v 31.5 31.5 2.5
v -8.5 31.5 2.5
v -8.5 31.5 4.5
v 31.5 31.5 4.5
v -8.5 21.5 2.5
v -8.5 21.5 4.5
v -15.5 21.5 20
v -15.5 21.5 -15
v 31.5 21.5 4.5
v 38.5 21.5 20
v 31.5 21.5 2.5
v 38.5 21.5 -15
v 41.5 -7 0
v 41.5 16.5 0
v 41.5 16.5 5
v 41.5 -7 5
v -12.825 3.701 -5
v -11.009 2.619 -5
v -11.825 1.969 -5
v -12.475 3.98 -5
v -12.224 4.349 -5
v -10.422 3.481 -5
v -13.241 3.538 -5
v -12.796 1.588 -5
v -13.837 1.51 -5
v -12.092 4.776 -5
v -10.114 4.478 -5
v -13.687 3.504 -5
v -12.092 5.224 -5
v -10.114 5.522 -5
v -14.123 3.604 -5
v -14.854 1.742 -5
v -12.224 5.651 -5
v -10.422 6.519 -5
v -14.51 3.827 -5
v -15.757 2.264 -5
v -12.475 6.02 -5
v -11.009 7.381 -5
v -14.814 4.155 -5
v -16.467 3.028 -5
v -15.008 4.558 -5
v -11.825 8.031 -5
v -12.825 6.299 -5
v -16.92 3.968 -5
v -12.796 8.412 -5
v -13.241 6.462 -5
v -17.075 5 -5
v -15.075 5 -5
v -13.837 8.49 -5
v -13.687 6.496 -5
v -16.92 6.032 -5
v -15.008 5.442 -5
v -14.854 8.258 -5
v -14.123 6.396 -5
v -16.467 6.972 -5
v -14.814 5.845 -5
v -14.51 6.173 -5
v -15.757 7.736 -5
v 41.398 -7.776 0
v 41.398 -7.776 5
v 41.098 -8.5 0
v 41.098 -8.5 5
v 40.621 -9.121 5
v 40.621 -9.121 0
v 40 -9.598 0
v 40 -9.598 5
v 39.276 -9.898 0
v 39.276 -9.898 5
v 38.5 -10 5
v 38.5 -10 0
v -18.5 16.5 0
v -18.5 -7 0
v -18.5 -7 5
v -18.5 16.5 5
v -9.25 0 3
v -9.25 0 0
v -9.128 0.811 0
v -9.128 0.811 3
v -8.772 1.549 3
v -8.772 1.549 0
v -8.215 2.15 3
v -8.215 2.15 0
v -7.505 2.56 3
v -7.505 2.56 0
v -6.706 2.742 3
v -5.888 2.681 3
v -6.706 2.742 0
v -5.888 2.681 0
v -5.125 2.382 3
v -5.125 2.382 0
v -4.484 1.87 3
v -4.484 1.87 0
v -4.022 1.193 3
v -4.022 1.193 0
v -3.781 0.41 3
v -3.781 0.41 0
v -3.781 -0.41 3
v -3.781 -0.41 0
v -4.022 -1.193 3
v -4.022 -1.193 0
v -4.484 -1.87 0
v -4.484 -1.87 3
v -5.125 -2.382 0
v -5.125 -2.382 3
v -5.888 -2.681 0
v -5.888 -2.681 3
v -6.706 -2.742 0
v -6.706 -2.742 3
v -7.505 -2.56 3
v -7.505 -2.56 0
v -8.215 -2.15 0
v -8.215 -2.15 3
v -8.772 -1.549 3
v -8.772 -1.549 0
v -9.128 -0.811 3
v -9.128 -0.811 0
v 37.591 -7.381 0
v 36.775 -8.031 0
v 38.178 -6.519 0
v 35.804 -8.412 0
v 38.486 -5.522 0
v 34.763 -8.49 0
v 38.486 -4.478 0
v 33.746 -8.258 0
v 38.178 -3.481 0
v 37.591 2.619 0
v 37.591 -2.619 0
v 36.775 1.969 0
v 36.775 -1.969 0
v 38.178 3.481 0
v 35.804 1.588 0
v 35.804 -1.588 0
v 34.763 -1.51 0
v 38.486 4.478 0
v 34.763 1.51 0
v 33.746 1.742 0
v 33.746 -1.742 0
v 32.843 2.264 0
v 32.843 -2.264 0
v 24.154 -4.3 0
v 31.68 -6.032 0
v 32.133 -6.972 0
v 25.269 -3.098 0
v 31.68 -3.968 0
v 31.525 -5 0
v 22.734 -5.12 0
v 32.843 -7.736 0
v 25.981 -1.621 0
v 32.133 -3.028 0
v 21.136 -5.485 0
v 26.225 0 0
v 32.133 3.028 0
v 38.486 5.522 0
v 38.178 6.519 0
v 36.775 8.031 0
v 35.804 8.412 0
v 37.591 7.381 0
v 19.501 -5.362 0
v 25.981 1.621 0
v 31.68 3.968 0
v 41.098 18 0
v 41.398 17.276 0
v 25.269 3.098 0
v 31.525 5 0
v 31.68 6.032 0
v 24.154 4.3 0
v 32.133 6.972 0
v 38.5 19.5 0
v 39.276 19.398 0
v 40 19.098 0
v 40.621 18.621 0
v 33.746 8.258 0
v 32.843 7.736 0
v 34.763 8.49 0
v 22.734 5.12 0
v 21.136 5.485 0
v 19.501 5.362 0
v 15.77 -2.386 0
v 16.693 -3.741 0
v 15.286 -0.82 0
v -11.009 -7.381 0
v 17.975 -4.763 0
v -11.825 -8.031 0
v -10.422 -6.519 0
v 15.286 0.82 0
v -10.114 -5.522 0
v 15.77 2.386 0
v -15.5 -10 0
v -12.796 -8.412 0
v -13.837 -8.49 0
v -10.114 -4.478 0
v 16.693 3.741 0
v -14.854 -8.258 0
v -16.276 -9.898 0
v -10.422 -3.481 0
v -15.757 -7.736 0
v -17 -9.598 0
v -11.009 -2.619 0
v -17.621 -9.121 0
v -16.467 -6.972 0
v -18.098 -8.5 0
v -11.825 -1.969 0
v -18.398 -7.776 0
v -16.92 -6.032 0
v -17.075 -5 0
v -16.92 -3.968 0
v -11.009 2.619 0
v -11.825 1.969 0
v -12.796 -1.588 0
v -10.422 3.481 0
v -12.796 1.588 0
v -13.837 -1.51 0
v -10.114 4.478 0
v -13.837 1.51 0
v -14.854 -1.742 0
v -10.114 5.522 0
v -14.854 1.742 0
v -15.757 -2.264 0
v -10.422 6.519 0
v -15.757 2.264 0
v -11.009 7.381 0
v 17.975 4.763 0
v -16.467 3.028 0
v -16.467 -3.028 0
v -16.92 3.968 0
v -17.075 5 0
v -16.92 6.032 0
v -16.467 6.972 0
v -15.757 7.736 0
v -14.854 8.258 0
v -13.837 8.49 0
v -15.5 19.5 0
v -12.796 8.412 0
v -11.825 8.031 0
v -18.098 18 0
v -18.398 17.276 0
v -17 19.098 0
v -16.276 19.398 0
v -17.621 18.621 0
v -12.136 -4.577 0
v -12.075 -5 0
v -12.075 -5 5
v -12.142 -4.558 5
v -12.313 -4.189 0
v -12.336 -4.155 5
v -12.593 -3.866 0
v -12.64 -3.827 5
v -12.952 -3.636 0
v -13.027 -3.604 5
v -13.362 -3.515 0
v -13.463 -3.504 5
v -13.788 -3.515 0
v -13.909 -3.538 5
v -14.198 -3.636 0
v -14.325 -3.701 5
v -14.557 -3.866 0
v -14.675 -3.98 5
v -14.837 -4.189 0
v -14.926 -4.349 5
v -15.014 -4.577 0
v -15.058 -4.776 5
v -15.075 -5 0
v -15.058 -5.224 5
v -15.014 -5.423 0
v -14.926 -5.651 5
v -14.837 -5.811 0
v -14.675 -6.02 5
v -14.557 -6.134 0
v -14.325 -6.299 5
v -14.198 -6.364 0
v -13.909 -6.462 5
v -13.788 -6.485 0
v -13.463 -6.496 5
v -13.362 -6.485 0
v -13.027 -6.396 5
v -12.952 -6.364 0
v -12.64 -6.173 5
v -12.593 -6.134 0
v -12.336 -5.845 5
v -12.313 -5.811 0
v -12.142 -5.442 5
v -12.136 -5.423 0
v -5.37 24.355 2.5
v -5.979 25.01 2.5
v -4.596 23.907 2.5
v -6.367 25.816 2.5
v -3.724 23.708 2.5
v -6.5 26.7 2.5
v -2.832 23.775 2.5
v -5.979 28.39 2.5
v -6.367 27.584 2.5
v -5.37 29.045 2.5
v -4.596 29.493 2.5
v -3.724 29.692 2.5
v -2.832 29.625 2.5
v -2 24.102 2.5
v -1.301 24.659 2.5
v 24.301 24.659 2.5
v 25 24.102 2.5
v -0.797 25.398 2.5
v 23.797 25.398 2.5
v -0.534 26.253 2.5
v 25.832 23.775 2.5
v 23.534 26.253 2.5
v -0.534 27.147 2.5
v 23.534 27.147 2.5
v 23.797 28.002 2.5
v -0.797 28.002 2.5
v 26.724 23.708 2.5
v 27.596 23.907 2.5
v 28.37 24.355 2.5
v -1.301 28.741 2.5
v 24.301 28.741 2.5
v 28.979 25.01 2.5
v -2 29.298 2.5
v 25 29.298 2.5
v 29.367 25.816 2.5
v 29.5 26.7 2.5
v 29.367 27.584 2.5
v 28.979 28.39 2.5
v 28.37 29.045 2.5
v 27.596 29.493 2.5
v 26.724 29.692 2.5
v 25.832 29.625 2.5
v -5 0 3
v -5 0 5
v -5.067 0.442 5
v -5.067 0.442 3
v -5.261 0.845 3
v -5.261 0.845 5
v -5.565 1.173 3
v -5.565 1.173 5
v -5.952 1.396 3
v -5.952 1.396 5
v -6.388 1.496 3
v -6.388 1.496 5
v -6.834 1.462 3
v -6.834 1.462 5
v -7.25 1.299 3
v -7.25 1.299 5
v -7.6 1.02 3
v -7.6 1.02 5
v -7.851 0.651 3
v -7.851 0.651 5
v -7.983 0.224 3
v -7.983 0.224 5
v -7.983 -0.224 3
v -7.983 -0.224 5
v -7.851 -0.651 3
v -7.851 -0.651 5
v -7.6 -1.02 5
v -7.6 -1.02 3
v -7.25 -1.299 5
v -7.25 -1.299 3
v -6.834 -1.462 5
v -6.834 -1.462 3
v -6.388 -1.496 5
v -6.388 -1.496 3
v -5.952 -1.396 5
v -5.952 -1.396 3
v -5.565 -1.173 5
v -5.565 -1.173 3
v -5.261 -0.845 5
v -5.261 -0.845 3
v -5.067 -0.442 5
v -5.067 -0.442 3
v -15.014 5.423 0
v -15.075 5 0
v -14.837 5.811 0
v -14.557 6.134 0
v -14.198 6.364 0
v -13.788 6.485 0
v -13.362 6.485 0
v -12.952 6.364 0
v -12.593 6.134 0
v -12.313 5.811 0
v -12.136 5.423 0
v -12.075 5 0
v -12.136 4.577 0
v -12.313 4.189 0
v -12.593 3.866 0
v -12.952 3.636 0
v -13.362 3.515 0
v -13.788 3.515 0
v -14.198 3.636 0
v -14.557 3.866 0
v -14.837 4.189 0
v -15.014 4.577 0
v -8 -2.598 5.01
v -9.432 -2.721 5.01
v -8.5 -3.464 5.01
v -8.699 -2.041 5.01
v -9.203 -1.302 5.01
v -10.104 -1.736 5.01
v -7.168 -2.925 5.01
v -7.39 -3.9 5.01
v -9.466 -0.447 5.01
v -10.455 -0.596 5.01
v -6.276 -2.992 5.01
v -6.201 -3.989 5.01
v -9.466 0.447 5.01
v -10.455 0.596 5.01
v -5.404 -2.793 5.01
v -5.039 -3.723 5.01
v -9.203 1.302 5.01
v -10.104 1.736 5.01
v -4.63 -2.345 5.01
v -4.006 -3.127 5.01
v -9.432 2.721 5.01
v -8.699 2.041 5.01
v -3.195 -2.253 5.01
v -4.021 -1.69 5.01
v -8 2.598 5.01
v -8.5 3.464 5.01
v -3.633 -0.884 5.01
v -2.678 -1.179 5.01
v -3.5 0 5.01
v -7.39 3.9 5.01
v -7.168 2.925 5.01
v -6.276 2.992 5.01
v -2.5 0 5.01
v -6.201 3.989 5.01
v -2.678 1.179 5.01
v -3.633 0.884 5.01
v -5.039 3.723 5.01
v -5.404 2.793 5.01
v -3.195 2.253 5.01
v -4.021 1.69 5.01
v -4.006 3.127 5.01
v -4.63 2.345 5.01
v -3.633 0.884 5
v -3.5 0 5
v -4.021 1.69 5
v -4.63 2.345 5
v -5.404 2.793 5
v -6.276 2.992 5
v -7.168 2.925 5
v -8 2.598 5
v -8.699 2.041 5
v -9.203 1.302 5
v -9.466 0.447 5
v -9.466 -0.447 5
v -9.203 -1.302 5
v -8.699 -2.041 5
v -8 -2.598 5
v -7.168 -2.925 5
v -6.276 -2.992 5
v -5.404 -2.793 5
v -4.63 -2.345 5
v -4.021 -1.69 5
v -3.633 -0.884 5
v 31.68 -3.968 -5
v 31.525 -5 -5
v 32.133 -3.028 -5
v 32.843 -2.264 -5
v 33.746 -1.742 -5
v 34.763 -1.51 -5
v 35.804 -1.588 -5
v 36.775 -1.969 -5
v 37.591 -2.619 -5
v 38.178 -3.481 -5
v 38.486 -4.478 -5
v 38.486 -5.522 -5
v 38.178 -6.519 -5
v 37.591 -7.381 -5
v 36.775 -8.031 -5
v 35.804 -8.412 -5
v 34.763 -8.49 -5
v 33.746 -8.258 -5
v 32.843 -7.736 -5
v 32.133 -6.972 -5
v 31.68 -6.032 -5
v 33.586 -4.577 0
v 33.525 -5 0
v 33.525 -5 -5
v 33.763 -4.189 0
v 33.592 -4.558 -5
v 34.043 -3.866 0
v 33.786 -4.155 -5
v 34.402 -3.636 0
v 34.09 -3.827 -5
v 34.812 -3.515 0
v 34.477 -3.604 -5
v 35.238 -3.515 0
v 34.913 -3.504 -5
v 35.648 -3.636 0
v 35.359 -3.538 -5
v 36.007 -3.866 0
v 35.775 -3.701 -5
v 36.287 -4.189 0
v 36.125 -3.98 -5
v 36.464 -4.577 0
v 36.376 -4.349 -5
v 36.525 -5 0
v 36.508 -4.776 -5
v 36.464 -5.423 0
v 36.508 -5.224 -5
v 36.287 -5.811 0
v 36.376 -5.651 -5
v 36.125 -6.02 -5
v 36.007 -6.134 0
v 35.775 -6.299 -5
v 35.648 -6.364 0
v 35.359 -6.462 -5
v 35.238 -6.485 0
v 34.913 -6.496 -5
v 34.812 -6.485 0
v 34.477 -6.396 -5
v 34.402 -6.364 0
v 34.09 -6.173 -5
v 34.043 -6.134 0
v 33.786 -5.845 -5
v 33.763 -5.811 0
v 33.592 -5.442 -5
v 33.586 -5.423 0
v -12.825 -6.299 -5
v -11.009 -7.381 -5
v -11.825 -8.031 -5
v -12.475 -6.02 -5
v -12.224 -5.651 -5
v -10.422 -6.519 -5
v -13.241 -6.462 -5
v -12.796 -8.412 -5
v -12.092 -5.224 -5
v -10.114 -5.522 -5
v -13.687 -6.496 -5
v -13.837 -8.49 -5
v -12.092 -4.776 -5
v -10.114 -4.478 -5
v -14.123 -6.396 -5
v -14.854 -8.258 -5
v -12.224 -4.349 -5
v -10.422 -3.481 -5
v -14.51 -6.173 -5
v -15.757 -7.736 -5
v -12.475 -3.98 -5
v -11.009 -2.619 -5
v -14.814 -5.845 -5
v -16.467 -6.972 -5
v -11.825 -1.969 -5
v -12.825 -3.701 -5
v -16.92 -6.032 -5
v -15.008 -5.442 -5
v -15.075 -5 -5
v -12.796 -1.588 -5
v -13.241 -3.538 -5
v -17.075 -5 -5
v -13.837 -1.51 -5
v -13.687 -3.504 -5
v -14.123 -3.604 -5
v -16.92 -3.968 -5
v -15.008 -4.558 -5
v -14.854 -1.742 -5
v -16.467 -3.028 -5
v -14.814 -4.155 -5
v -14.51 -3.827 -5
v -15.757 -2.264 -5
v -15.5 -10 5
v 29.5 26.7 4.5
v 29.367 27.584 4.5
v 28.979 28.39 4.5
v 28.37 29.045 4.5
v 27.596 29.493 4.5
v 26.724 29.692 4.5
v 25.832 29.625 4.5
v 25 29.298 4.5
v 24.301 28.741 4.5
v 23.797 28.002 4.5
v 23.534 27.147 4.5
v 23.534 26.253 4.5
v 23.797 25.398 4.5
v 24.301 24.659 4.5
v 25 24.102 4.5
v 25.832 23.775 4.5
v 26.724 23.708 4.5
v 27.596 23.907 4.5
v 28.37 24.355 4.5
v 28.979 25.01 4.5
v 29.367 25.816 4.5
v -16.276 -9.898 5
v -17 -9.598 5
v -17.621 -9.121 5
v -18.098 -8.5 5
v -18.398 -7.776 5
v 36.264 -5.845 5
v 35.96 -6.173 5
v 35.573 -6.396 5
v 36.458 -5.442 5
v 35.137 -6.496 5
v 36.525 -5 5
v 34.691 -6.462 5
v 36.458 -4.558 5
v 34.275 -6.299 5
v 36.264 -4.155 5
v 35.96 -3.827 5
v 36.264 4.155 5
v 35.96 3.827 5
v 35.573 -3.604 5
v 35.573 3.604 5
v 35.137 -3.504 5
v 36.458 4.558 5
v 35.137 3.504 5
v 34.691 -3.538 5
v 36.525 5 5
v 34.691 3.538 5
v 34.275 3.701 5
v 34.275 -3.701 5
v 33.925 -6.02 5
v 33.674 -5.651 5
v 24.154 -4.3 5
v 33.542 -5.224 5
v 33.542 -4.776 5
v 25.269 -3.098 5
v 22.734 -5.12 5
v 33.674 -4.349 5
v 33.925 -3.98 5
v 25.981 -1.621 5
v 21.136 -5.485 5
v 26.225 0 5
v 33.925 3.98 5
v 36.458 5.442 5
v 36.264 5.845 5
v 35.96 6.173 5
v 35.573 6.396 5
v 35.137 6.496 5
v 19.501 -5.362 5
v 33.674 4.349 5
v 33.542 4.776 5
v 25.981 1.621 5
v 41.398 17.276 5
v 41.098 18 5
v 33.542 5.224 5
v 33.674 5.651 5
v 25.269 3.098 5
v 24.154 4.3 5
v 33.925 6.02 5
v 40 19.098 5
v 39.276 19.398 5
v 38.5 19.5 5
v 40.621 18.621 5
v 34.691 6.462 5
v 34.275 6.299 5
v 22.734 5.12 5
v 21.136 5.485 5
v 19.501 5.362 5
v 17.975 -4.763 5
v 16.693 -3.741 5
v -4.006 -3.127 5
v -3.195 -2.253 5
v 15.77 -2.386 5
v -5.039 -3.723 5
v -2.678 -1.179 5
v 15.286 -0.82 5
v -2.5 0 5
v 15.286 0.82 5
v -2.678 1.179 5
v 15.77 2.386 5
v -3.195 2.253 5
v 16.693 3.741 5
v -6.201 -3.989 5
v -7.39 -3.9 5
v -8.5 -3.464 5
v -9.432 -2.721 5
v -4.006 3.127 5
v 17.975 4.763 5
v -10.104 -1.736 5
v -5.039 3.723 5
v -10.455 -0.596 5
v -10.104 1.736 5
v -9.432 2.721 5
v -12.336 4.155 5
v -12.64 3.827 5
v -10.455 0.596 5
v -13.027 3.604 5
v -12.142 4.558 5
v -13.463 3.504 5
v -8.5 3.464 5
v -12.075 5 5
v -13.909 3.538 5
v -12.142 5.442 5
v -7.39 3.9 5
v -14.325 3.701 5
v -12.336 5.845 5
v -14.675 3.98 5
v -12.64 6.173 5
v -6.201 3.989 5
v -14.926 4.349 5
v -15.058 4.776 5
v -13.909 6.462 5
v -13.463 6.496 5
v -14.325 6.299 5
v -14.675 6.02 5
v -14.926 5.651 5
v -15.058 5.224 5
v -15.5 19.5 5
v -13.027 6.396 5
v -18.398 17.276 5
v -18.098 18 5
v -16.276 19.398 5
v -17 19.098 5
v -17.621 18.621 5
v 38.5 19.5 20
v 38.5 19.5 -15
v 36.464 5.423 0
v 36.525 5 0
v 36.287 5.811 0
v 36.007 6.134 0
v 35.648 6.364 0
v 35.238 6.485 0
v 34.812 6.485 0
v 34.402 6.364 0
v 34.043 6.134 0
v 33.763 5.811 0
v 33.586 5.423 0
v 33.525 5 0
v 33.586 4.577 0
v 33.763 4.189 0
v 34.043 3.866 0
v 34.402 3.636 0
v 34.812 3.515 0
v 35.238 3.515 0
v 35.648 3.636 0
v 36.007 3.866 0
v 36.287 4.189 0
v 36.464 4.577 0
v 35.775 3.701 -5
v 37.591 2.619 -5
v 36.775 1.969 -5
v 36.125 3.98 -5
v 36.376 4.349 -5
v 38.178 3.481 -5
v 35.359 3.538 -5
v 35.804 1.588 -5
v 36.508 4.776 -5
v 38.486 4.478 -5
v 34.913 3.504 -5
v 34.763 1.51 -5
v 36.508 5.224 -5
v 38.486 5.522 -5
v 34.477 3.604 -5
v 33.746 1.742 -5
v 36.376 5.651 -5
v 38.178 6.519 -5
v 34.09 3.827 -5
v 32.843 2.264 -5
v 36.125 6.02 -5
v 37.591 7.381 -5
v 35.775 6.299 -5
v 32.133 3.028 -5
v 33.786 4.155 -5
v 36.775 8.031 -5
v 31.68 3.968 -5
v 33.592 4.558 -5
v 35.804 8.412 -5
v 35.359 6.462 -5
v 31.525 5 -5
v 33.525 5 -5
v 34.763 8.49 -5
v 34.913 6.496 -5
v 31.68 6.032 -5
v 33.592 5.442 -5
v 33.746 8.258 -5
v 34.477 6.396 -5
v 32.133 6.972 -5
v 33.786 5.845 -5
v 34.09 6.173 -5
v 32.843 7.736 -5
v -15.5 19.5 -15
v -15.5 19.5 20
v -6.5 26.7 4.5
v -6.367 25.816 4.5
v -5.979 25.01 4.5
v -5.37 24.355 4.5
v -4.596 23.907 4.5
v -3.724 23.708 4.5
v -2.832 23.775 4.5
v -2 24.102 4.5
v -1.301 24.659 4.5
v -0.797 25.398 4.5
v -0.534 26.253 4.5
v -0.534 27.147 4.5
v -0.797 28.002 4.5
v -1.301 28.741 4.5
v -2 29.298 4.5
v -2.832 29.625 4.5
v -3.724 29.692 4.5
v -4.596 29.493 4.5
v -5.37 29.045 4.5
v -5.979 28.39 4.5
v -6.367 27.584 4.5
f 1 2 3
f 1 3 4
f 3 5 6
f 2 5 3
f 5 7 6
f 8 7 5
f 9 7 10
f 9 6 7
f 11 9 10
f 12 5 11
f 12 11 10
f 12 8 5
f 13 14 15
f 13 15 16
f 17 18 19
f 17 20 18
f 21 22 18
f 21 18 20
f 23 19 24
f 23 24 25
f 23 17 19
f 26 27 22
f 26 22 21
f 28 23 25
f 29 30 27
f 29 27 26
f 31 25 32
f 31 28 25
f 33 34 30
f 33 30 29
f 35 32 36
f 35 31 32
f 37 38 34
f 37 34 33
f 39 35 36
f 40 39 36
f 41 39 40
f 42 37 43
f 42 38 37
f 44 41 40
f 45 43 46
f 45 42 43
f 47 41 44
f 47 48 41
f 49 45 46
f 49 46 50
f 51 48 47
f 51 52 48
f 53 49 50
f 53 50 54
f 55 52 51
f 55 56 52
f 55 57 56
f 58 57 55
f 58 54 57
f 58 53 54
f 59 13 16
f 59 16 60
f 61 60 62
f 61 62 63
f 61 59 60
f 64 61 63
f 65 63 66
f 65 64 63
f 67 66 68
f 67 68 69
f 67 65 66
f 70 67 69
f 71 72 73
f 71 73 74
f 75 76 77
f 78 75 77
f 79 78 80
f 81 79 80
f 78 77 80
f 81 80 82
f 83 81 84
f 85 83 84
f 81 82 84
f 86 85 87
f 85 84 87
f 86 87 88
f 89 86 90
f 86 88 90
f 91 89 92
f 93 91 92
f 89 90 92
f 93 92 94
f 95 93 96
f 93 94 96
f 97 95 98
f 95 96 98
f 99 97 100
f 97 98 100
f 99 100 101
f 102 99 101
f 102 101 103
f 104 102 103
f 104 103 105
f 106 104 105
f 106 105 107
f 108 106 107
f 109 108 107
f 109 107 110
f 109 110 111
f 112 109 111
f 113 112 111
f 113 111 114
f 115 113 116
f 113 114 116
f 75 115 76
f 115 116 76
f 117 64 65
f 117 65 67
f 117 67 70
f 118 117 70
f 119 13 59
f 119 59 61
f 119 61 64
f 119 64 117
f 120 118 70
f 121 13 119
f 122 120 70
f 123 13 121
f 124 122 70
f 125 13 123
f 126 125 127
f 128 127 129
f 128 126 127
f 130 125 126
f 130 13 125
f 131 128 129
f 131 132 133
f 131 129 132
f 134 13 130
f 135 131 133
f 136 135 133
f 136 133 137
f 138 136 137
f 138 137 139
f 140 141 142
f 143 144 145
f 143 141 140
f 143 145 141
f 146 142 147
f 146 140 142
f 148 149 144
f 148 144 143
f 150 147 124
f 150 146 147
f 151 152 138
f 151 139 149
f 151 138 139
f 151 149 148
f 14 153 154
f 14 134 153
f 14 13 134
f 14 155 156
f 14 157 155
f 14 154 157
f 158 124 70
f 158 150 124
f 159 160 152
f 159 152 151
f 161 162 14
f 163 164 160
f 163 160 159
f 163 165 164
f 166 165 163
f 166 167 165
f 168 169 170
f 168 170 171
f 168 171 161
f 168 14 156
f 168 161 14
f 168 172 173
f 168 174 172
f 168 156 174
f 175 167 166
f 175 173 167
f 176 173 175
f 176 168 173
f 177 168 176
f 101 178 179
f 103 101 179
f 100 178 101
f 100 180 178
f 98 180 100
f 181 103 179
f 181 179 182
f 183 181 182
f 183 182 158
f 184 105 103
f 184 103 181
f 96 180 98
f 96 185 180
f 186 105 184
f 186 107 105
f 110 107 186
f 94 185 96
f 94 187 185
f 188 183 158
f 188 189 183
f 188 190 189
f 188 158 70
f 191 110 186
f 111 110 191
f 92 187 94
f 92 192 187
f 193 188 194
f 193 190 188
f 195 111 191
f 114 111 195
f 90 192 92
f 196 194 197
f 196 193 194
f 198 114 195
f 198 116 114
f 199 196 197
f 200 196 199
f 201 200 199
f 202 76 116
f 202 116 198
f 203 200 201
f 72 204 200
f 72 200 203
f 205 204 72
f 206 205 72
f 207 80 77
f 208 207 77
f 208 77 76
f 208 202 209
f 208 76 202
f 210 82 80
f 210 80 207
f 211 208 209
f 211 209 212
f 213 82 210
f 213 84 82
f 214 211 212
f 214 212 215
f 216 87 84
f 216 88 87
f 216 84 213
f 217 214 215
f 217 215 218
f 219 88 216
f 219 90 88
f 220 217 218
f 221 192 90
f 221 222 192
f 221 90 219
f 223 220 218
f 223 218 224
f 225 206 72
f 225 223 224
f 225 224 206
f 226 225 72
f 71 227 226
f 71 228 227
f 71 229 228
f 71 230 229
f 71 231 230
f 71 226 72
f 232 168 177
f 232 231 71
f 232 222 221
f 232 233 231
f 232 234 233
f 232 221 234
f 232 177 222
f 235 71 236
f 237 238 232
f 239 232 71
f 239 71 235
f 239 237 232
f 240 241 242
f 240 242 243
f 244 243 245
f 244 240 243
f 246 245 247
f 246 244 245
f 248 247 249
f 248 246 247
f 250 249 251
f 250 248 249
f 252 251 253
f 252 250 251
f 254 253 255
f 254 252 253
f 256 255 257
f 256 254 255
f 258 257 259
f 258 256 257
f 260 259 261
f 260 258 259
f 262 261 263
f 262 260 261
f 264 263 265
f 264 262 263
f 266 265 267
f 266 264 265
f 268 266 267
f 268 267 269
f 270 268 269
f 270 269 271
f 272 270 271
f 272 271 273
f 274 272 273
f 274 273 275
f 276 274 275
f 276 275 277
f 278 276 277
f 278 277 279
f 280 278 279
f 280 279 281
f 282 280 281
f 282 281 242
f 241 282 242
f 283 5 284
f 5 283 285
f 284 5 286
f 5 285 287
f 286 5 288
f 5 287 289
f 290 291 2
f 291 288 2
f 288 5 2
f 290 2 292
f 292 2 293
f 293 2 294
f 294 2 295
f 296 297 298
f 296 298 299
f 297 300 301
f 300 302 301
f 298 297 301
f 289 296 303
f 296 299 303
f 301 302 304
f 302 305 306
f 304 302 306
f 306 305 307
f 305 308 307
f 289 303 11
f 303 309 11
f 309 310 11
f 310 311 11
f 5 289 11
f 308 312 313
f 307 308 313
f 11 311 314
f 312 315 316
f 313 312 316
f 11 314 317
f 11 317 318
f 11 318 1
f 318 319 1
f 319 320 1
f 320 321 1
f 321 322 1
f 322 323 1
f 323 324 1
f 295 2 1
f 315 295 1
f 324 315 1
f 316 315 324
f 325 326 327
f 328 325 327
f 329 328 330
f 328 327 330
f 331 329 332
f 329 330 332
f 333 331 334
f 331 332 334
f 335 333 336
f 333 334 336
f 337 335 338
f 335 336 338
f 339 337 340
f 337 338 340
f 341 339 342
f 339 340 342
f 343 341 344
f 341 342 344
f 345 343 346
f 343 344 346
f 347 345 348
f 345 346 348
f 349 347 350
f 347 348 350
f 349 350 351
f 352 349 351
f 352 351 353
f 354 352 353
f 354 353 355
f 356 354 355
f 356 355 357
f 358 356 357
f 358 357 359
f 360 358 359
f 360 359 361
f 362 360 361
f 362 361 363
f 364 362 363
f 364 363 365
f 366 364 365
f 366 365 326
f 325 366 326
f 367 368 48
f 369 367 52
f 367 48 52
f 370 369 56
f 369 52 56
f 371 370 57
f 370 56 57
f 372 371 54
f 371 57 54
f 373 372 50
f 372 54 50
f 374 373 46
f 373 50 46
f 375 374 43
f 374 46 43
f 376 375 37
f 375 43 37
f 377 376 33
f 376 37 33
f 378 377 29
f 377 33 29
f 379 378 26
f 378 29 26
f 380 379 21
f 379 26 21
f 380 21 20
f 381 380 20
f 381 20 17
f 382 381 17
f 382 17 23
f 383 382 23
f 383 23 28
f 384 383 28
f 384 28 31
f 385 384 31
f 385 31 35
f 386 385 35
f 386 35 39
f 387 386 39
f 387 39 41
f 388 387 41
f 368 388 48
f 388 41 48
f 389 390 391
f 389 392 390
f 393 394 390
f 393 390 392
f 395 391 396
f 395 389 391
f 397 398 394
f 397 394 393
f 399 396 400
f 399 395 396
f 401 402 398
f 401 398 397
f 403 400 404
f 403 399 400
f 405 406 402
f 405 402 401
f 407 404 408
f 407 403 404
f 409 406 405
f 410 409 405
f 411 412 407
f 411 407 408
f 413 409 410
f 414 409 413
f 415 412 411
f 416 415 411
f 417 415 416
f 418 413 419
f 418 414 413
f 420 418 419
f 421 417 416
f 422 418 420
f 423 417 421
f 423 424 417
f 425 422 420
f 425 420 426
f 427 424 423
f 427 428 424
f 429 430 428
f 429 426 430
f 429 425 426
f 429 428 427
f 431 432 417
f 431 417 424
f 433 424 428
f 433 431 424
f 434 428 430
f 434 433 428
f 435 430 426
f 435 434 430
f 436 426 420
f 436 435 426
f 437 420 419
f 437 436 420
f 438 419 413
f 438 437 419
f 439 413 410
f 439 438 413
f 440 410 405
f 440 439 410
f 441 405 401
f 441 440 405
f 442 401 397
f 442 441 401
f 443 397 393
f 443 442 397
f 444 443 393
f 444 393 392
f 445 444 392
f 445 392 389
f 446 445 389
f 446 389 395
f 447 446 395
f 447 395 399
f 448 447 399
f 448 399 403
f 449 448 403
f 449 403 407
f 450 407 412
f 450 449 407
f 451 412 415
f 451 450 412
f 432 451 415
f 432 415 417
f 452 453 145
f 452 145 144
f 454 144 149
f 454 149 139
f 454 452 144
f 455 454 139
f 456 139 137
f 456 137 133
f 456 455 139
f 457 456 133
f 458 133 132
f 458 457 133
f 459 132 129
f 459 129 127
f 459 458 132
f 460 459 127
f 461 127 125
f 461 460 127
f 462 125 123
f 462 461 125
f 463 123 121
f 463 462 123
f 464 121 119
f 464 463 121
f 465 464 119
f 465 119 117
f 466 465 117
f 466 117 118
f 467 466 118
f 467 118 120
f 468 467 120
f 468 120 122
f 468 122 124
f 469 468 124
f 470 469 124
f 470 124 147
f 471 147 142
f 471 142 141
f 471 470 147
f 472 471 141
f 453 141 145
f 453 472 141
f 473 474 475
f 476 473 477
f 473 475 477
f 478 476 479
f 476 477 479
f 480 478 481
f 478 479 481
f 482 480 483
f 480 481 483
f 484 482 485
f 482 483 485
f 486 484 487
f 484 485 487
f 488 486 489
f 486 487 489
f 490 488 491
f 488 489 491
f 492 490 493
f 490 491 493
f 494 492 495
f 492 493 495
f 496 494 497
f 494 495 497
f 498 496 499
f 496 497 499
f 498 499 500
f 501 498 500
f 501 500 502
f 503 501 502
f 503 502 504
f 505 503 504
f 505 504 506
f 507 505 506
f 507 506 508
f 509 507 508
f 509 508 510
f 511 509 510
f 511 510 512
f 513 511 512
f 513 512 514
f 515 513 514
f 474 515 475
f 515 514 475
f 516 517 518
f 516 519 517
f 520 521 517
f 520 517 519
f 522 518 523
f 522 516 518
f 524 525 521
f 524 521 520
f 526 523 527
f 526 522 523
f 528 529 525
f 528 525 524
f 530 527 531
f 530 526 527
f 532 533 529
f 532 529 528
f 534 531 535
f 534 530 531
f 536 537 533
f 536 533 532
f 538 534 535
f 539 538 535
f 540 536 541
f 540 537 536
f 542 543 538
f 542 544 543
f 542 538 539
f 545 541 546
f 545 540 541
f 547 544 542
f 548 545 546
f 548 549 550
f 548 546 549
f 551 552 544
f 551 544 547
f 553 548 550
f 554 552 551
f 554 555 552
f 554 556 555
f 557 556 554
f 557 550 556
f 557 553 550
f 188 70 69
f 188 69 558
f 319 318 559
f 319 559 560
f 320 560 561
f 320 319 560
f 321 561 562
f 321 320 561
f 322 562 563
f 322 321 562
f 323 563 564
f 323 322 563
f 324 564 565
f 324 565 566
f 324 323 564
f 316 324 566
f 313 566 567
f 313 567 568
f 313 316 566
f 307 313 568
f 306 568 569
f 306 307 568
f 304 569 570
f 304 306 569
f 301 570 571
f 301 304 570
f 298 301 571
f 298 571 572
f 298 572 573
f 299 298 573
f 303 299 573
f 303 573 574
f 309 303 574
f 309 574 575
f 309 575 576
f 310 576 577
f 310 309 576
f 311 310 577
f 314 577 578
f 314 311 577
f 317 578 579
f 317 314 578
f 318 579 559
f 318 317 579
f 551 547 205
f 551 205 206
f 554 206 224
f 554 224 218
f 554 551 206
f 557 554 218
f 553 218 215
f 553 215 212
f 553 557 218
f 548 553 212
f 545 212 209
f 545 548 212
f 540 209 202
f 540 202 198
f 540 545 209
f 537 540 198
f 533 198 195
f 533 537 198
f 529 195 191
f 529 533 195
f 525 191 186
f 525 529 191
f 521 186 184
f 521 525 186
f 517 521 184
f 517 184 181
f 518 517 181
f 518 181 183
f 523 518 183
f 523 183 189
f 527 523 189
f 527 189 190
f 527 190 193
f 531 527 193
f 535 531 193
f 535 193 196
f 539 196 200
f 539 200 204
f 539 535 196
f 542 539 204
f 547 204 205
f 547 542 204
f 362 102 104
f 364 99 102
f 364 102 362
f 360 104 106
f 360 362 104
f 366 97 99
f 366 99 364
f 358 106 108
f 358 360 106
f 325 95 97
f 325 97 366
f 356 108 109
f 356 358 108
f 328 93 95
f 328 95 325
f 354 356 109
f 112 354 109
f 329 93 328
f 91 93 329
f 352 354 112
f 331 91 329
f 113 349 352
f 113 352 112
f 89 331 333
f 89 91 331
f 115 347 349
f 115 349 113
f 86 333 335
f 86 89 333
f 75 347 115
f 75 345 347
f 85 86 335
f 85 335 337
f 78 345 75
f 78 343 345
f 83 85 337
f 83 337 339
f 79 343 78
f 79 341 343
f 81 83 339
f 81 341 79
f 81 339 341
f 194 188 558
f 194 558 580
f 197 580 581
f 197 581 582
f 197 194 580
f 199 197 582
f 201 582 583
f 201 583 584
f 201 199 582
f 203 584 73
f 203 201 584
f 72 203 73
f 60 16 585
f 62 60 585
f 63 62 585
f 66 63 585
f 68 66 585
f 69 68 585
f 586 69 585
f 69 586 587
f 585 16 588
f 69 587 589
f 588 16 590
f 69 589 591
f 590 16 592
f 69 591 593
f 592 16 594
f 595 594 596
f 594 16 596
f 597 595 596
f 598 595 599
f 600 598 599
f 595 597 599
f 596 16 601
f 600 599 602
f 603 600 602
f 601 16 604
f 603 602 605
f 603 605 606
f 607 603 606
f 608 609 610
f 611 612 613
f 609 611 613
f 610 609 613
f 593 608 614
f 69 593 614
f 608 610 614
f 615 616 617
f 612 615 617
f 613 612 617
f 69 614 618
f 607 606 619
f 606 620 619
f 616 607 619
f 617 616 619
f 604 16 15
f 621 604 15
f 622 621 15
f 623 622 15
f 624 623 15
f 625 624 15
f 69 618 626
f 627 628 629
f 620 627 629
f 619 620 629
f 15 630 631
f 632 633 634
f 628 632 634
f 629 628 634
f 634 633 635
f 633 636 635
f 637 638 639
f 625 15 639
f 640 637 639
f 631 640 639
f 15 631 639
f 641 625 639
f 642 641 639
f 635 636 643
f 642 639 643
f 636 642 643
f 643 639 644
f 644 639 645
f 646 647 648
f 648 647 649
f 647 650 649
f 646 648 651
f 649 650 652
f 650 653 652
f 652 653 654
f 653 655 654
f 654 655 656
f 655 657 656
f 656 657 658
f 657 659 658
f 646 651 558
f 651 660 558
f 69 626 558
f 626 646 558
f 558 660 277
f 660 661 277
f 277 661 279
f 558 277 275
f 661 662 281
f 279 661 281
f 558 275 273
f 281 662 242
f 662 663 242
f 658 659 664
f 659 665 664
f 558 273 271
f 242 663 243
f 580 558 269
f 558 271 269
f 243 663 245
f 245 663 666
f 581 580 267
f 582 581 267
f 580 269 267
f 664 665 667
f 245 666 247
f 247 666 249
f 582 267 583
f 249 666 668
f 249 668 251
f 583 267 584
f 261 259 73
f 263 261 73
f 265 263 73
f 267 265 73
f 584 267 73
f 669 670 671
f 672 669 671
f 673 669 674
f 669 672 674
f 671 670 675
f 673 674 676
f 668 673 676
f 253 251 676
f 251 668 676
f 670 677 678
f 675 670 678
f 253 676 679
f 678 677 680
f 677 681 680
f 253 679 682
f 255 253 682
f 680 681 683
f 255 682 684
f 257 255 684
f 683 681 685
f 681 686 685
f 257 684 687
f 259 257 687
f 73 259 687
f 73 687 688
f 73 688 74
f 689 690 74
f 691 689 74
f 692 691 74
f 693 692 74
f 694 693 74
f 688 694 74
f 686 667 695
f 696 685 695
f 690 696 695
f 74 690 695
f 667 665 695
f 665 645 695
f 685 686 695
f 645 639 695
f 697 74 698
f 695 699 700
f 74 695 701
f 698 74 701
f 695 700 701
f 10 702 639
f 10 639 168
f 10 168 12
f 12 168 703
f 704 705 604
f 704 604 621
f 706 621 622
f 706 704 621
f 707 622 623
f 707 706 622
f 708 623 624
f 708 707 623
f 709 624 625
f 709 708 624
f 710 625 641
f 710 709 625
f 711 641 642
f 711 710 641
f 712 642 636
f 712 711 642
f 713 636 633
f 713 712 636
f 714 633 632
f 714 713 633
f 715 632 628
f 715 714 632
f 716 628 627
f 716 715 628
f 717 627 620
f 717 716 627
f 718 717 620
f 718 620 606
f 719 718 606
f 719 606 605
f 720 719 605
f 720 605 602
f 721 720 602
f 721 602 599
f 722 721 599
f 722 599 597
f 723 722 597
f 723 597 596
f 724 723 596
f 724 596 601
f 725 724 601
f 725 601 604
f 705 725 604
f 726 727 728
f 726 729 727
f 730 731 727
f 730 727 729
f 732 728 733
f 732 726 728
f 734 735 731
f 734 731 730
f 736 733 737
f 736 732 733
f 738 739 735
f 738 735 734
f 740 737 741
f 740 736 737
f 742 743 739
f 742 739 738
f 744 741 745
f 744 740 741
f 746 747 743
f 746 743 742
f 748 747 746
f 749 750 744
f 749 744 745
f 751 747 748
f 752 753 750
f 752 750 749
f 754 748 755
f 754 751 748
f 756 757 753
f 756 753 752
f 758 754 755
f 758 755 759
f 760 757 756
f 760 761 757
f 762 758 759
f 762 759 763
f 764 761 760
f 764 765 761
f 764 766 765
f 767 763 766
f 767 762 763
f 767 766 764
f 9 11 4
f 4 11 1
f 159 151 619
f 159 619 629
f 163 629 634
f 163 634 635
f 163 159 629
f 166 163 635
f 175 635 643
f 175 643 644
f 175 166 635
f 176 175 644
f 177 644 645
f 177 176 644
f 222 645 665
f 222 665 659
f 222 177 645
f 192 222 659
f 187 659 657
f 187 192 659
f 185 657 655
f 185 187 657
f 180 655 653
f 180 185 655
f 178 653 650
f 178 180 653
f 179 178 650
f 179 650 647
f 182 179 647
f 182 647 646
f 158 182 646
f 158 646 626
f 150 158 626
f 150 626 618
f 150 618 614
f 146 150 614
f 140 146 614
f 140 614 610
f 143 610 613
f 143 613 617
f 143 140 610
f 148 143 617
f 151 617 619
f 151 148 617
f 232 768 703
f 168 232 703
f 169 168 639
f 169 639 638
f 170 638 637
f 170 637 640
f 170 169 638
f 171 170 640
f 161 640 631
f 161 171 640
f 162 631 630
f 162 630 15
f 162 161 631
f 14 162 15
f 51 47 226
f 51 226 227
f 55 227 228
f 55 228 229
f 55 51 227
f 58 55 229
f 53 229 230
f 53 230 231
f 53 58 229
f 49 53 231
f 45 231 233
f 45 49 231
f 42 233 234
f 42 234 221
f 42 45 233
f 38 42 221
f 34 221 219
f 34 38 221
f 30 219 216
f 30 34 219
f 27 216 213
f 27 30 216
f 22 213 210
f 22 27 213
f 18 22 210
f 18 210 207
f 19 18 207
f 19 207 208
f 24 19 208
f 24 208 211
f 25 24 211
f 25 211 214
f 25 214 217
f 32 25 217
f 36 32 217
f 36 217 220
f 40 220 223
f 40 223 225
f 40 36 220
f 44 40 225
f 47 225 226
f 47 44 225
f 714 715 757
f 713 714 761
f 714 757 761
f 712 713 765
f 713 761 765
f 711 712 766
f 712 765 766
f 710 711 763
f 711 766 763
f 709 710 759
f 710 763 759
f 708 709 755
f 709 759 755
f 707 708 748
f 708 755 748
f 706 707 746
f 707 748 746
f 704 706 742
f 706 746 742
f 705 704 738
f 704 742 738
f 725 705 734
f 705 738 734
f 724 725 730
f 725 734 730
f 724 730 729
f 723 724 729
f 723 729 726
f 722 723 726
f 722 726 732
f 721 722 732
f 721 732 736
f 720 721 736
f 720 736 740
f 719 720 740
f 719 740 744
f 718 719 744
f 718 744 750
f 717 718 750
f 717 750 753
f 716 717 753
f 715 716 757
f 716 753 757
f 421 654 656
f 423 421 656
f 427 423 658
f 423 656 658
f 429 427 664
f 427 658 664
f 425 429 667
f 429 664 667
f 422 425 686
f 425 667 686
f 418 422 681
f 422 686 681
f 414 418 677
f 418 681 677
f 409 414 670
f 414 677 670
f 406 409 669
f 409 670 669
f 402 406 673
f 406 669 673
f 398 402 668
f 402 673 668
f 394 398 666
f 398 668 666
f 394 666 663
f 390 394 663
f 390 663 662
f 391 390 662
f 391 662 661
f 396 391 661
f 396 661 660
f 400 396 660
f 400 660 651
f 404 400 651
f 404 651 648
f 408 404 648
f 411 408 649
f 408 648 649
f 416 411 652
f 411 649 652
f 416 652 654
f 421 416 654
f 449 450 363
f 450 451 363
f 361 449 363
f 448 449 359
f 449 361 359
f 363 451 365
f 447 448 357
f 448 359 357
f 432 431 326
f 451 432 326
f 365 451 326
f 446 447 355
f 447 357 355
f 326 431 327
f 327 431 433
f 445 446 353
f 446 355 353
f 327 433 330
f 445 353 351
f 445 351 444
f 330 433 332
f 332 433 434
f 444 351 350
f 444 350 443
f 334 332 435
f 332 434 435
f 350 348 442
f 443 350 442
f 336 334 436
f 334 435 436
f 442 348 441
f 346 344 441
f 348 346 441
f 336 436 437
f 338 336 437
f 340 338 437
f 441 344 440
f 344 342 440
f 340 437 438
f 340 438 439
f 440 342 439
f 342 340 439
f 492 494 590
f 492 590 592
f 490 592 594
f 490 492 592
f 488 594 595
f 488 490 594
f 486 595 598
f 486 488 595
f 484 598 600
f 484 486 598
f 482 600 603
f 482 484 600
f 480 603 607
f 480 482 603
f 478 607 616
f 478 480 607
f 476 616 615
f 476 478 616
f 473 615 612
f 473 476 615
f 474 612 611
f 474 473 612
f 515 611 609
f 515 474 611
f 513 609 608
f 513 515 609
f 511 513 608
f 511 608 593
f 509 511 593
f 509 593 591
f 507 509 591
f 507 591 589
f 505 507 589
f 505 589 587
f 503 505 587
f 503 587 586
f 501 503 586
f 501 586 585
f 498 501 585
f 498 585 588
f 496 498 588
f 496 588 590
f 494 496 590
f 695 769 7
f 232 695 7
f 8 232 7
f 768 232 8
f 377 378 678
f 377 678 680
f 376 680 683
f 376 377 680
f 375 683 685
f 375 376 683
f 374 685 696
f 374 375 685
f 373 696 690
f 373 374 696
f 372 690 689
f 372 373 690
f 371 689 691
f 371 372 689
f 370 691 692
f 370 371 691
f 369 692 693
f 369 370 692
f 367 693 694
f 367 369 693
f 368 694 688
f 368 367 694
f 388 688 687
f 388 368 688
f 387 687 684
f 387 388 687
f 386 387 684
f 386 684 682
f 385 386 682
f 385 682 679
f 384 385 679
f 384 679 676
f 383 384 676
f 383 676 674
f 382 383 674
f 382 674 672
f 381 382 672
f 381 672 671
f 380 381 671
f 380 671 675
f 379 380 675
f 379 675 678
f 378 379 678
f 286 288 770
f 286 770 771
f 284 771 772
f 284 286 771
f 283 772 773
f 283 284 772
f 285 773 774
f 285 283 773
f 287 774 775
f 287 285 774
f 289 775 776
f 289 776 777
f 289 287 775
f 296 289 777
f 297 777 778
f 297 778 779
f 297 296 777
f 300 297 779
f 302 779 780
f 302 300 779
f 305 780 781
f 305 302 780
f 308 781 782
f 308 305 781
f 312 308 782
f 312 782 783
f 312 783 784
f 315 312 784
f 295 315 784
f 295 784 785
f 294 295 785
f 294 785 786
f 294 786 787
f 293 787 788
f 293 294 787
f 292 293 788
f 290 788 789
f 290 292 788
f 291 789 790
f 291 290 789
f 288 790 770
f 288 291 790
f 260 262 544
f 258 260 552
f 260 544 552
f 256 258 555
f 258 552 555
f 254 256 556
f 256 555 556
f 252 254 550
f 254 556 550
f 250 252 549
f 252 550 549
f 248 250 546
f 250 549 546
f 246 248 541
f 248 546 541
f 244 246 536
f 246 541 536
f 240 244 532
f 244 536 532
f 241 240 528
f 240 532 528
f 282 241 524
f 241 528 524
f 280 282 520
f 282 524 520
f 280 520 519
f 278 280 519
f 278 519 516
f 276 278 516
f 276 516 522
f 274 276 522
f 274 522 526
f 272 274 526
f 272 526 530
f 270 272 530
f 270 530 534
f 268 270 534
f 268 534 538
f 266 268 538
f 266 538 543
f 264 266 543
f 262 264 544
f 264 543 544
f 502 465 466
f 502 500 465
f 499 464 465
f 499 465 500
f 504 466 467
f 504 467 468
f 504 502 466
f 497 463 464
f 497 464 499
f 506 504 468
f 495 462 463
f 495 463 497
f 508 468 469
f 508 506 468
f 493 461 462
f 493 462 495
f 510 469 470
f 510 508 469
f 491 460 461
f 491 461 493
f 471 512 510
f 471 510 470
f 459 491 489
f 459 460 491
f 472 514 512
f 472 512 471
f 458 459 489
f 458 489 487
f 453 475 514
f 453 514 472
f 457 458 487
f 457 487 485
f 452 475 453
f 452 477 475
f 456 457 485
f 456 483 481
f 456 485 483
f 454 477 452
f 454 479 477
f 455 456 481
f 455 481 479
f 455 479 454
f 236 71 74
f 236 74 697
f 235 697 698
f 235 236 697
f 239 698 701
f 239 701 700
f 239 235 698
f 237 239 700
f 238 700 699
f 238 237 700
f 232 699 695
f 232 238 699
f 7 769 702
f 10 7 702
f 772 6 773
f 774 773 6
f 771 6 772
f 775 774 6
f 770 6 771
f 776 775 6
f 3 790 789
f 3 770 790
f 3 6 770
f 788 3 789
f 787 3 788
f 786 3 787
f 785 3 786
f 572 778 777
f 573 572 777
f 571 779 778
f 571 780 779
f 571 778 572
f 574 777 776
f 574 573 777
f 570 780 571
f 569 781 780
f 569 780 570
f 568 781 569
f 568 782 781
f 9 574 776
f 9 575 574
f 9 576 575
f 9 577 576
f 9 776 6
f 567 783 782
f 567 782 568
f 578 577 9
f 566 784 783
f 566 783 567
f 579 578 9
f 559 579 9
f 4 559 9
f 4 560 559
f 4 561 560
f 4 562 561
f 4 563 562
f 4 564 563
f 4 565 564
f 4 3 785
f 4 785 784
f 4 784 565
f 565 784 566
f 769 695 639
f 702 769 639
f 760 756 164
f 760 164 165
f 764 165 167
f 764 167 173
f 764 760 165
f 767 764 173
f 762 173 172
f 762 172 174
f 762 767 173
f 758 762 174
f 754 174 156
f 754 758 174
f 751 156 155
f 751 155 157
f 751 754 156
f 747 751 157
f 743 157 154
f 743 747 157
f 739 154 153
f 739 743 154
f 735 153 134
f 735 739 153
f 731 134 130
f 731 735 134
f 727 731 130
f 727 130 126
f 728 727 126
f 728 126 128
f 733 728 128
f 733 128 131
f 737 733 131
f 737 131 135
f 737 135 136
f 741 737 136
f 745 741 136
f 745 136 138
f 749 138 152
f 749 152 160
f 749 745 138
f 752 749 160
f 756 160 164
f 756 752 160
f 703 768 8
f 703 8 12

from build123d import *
from build123d.topology import SkipClean

# Parameters (mm, degrees)
SKETCH_1_R          = 1.5
SKETCH_1_R_2        = 5.5
EXTRUDE_1_DEPTH     = 5
SKETCH_3_R          = 4
SKETCH_3_R_2        = 3
EXTRUDE_1_2_DEPTH   = 0.01
SKETCH_7_W          = 54
SKETCH_7_H          = 35
EXTRUDE_2_DEPTH     = 2
EXTRUDE_START       = 5
SKETCH_8_R          = 3.5
SKETCH_8_R_2        = 1.5
EXTRUDE_2_2_DEPTH   = 5
SKETCH_10_W         = 40
SKETCH_10_H         = 10
SKETCH_10_R         = 3
EXTRUDE_3_DEPTH     = 2
SKETCH_11_R         = 1.5
CUT_EXTRUDE_1_DEPTH = 10
SKETCH_12_R         = 2.75
CUT_EXTRUDE_2_DEPTH = 3


with BuildPart() as part:
    # 草图1 → Extrude 1 (new body)
    with BuildSketch(Plane.XY):
        with BuildLine():
            Line((-15.5, 19.5), (38.5, 19.5))
            ThreePointArc((38.5, 19.5), (40.621320344, 18.621320344), (41.5, 16.5))
            Line((41.5, 16.5), (41.5, -7))
            ThreePointArc((41.5, -7), (40.621320344, -9.121320344), (38.5, -10))
            Line((38.5, -10), (33.3, -10))
            Line((33.3, -10), (30.825, -10))
            Line((30.825, -10), (-9.175, -10))
            Line((-9.175, -10), (-15.5, -10))
            ThreePointArc((-15.5, -10), (-17.621320344, -9.121320344), (-18.5, -7))
            Line((-18.5, -7), (-18.5, 16.5))
            ThreePointArc((-18.5, 16.5), (-17.621320344, 18.621320344), (-15.5, 19.5))
        make_face()
        with Locations((-13.575, 5)):
            Circle(SKETCH_1_R, mode=Mode.SUBTRACT)
        with Locations((-13.575, -5)):
            Circle(SKETCH_1_R, mode=Mode.SUBTRACT)
        with Locations((35.025, 5)):
            Circle(SKETCH_1_R, mode=Mode.SUBTRACT)
        with Locations((35.025, -5)):
            Circle(SKETCH_1_R, mode=Mode.SUBTRACT)
        with Locations((20.725, 0)):
            Circle(SKETCH_1_R_2, mode=Mode.SUBTRACT)
    extrude(amount=EXTRUDE_1_DEPTH)

    # 草图3 → Extrude 1 2 (add)
    with BuildSketch(Plane.XY.offset(5)):
        with Locations((-6.5, 0)):
            Circle(SKETCH_3_R)
        with Locations((-6.5, 0)):
            Circle(SKETCH_3_R_2, mode=Mode.SUBTRACT)
    extrude(amount=EXTRUDE_1_2_DEPTH)

    # 草图7 → Extrude 2 (add)
    with BuildSketch(Plane(origin=(0, 19.5, 0), x_dir=(1, 0, 0), z_dir=(0, 1, 0))):
        with Locations((11.5, -2.5)):
            Rectangle(SKETCH_7_W, SKETCH_7_H)
    extrude(amount=EXTRUDE_2_DEPTH)

    # 草图8 → Extrude 2 2 (add)
    # profile 1 of 4: a face of its own
    with SkipClean():  # the faces are left unmerged after this step: merging them gives an invalid solid
        with BuildSketch(Plane(origin=(0, 0, 0), x_dir=(-1, 0, 0), z_dir=(0, 0, -1)).offset(EXTRUDE_START)):
            with Locations((-35.025, 5)):
                Circle(SKETCH_8_R)
            with Locations((-35.025, 5)):
                Circle(SKETCH_8_R_2, mode=Mode.SUBTRACT)
        # profile 2 of 4: a face of its own
        with BuildSketch(Plane(origin=(0, 0, 0), x_dir=(-1, 0, 0), z_dir=(0, 0, -1)).offset(EXTRUDE_START)):
            with Locations((-35.025, -5)):
                Circle(SKETCH_8_R)
            with Locations((-35.025, -5)):
                Circle(SKETCH_8_R_2, mode=Mode.SUBTRACT)
        # profile 3 of 4: a face of its own
        with BuildSketch(Plane(origin=(0, 0, 0), x_dir=(-1, 0, 0), z_dir=(0, 0, -1)).offset(EXTRUDE_START)):
            with Locations((13.575, 5)):
                Circle(SKETCH_8_R)
            with Locations((13.575, 5)):
                Circle(SKETCH_8_R_2, mode=Mode.SUBTRACT)
        # profile 4 of 4: a face of its own
        with BuildSketch(Plane(origin=(0, 0, 0), x_dir=(-1, 0, 0), z_dir=(0, 0, -1)).offset(EXTRUDE_START)):
            with Locations((13.575, -5)):
                Circle(SKETCH_8_R)
            with Locations((13.575, -5)):
                Circle(SKETCH_8_R_2, mode=Mode.SUBTRACT)
        extrude(amount=-EXTRUDE_2_2_DEPTH)

    # 草图10 → 凸台-拉伸3 (add)
    with SkipClean():  # the faces are left unmerged after this step: merging them gives an invalid solid
        with BuildSketch(Plane.XY.offset(2.5)):
            with Locations((11.5, 26.5)):
                Rectangle(SKETCH_10_W, SKETCH_10_H)
            with Locations((26.5, 26.7)):
                Circle(SKETCH_10_R, mode=Mode.SUBTRACT)
            with Locations(Location((-3.5, 26.7, 0), (0, 0, 180))):
                Circle(SKETCH_10_R, mode=Mode.SUBTRACT)
        extrude(amount=EXTRUDE_3_DEPTH)

    # 草图11 → 切除-拉伸1 (cut)
    with SkipClean():  # the faces are left unmerged after this step: merging them gives an invalid solid
        with BuildSketch(Plane.XY.offset(5)):
            with Locations((-6.5, 0)):
                Circle(SKETCH_11_R)
        extrude(amount=-CUT_EXTRUDE_1_DEPTH, mode=Mode.SUBTRACT)

    # 草图12 → 切除-拉伸2 (cut)
    with SkipClean():  # the faces are left unmerged after this step: merging them gives an invalid solid
        with BuildSketch(Plane(origin=(0, 0, 0), x_dir=(-1, 0, 0), z_dir=(0, 0, -1))):
            with Locations((6.5, 0)):
                Circle(SKETCH_12_R)
        extrude(amount=-CUT_EXTRUDE_2_DEPTH, mode=Mode.SUBTRACT)


solid = part.part
